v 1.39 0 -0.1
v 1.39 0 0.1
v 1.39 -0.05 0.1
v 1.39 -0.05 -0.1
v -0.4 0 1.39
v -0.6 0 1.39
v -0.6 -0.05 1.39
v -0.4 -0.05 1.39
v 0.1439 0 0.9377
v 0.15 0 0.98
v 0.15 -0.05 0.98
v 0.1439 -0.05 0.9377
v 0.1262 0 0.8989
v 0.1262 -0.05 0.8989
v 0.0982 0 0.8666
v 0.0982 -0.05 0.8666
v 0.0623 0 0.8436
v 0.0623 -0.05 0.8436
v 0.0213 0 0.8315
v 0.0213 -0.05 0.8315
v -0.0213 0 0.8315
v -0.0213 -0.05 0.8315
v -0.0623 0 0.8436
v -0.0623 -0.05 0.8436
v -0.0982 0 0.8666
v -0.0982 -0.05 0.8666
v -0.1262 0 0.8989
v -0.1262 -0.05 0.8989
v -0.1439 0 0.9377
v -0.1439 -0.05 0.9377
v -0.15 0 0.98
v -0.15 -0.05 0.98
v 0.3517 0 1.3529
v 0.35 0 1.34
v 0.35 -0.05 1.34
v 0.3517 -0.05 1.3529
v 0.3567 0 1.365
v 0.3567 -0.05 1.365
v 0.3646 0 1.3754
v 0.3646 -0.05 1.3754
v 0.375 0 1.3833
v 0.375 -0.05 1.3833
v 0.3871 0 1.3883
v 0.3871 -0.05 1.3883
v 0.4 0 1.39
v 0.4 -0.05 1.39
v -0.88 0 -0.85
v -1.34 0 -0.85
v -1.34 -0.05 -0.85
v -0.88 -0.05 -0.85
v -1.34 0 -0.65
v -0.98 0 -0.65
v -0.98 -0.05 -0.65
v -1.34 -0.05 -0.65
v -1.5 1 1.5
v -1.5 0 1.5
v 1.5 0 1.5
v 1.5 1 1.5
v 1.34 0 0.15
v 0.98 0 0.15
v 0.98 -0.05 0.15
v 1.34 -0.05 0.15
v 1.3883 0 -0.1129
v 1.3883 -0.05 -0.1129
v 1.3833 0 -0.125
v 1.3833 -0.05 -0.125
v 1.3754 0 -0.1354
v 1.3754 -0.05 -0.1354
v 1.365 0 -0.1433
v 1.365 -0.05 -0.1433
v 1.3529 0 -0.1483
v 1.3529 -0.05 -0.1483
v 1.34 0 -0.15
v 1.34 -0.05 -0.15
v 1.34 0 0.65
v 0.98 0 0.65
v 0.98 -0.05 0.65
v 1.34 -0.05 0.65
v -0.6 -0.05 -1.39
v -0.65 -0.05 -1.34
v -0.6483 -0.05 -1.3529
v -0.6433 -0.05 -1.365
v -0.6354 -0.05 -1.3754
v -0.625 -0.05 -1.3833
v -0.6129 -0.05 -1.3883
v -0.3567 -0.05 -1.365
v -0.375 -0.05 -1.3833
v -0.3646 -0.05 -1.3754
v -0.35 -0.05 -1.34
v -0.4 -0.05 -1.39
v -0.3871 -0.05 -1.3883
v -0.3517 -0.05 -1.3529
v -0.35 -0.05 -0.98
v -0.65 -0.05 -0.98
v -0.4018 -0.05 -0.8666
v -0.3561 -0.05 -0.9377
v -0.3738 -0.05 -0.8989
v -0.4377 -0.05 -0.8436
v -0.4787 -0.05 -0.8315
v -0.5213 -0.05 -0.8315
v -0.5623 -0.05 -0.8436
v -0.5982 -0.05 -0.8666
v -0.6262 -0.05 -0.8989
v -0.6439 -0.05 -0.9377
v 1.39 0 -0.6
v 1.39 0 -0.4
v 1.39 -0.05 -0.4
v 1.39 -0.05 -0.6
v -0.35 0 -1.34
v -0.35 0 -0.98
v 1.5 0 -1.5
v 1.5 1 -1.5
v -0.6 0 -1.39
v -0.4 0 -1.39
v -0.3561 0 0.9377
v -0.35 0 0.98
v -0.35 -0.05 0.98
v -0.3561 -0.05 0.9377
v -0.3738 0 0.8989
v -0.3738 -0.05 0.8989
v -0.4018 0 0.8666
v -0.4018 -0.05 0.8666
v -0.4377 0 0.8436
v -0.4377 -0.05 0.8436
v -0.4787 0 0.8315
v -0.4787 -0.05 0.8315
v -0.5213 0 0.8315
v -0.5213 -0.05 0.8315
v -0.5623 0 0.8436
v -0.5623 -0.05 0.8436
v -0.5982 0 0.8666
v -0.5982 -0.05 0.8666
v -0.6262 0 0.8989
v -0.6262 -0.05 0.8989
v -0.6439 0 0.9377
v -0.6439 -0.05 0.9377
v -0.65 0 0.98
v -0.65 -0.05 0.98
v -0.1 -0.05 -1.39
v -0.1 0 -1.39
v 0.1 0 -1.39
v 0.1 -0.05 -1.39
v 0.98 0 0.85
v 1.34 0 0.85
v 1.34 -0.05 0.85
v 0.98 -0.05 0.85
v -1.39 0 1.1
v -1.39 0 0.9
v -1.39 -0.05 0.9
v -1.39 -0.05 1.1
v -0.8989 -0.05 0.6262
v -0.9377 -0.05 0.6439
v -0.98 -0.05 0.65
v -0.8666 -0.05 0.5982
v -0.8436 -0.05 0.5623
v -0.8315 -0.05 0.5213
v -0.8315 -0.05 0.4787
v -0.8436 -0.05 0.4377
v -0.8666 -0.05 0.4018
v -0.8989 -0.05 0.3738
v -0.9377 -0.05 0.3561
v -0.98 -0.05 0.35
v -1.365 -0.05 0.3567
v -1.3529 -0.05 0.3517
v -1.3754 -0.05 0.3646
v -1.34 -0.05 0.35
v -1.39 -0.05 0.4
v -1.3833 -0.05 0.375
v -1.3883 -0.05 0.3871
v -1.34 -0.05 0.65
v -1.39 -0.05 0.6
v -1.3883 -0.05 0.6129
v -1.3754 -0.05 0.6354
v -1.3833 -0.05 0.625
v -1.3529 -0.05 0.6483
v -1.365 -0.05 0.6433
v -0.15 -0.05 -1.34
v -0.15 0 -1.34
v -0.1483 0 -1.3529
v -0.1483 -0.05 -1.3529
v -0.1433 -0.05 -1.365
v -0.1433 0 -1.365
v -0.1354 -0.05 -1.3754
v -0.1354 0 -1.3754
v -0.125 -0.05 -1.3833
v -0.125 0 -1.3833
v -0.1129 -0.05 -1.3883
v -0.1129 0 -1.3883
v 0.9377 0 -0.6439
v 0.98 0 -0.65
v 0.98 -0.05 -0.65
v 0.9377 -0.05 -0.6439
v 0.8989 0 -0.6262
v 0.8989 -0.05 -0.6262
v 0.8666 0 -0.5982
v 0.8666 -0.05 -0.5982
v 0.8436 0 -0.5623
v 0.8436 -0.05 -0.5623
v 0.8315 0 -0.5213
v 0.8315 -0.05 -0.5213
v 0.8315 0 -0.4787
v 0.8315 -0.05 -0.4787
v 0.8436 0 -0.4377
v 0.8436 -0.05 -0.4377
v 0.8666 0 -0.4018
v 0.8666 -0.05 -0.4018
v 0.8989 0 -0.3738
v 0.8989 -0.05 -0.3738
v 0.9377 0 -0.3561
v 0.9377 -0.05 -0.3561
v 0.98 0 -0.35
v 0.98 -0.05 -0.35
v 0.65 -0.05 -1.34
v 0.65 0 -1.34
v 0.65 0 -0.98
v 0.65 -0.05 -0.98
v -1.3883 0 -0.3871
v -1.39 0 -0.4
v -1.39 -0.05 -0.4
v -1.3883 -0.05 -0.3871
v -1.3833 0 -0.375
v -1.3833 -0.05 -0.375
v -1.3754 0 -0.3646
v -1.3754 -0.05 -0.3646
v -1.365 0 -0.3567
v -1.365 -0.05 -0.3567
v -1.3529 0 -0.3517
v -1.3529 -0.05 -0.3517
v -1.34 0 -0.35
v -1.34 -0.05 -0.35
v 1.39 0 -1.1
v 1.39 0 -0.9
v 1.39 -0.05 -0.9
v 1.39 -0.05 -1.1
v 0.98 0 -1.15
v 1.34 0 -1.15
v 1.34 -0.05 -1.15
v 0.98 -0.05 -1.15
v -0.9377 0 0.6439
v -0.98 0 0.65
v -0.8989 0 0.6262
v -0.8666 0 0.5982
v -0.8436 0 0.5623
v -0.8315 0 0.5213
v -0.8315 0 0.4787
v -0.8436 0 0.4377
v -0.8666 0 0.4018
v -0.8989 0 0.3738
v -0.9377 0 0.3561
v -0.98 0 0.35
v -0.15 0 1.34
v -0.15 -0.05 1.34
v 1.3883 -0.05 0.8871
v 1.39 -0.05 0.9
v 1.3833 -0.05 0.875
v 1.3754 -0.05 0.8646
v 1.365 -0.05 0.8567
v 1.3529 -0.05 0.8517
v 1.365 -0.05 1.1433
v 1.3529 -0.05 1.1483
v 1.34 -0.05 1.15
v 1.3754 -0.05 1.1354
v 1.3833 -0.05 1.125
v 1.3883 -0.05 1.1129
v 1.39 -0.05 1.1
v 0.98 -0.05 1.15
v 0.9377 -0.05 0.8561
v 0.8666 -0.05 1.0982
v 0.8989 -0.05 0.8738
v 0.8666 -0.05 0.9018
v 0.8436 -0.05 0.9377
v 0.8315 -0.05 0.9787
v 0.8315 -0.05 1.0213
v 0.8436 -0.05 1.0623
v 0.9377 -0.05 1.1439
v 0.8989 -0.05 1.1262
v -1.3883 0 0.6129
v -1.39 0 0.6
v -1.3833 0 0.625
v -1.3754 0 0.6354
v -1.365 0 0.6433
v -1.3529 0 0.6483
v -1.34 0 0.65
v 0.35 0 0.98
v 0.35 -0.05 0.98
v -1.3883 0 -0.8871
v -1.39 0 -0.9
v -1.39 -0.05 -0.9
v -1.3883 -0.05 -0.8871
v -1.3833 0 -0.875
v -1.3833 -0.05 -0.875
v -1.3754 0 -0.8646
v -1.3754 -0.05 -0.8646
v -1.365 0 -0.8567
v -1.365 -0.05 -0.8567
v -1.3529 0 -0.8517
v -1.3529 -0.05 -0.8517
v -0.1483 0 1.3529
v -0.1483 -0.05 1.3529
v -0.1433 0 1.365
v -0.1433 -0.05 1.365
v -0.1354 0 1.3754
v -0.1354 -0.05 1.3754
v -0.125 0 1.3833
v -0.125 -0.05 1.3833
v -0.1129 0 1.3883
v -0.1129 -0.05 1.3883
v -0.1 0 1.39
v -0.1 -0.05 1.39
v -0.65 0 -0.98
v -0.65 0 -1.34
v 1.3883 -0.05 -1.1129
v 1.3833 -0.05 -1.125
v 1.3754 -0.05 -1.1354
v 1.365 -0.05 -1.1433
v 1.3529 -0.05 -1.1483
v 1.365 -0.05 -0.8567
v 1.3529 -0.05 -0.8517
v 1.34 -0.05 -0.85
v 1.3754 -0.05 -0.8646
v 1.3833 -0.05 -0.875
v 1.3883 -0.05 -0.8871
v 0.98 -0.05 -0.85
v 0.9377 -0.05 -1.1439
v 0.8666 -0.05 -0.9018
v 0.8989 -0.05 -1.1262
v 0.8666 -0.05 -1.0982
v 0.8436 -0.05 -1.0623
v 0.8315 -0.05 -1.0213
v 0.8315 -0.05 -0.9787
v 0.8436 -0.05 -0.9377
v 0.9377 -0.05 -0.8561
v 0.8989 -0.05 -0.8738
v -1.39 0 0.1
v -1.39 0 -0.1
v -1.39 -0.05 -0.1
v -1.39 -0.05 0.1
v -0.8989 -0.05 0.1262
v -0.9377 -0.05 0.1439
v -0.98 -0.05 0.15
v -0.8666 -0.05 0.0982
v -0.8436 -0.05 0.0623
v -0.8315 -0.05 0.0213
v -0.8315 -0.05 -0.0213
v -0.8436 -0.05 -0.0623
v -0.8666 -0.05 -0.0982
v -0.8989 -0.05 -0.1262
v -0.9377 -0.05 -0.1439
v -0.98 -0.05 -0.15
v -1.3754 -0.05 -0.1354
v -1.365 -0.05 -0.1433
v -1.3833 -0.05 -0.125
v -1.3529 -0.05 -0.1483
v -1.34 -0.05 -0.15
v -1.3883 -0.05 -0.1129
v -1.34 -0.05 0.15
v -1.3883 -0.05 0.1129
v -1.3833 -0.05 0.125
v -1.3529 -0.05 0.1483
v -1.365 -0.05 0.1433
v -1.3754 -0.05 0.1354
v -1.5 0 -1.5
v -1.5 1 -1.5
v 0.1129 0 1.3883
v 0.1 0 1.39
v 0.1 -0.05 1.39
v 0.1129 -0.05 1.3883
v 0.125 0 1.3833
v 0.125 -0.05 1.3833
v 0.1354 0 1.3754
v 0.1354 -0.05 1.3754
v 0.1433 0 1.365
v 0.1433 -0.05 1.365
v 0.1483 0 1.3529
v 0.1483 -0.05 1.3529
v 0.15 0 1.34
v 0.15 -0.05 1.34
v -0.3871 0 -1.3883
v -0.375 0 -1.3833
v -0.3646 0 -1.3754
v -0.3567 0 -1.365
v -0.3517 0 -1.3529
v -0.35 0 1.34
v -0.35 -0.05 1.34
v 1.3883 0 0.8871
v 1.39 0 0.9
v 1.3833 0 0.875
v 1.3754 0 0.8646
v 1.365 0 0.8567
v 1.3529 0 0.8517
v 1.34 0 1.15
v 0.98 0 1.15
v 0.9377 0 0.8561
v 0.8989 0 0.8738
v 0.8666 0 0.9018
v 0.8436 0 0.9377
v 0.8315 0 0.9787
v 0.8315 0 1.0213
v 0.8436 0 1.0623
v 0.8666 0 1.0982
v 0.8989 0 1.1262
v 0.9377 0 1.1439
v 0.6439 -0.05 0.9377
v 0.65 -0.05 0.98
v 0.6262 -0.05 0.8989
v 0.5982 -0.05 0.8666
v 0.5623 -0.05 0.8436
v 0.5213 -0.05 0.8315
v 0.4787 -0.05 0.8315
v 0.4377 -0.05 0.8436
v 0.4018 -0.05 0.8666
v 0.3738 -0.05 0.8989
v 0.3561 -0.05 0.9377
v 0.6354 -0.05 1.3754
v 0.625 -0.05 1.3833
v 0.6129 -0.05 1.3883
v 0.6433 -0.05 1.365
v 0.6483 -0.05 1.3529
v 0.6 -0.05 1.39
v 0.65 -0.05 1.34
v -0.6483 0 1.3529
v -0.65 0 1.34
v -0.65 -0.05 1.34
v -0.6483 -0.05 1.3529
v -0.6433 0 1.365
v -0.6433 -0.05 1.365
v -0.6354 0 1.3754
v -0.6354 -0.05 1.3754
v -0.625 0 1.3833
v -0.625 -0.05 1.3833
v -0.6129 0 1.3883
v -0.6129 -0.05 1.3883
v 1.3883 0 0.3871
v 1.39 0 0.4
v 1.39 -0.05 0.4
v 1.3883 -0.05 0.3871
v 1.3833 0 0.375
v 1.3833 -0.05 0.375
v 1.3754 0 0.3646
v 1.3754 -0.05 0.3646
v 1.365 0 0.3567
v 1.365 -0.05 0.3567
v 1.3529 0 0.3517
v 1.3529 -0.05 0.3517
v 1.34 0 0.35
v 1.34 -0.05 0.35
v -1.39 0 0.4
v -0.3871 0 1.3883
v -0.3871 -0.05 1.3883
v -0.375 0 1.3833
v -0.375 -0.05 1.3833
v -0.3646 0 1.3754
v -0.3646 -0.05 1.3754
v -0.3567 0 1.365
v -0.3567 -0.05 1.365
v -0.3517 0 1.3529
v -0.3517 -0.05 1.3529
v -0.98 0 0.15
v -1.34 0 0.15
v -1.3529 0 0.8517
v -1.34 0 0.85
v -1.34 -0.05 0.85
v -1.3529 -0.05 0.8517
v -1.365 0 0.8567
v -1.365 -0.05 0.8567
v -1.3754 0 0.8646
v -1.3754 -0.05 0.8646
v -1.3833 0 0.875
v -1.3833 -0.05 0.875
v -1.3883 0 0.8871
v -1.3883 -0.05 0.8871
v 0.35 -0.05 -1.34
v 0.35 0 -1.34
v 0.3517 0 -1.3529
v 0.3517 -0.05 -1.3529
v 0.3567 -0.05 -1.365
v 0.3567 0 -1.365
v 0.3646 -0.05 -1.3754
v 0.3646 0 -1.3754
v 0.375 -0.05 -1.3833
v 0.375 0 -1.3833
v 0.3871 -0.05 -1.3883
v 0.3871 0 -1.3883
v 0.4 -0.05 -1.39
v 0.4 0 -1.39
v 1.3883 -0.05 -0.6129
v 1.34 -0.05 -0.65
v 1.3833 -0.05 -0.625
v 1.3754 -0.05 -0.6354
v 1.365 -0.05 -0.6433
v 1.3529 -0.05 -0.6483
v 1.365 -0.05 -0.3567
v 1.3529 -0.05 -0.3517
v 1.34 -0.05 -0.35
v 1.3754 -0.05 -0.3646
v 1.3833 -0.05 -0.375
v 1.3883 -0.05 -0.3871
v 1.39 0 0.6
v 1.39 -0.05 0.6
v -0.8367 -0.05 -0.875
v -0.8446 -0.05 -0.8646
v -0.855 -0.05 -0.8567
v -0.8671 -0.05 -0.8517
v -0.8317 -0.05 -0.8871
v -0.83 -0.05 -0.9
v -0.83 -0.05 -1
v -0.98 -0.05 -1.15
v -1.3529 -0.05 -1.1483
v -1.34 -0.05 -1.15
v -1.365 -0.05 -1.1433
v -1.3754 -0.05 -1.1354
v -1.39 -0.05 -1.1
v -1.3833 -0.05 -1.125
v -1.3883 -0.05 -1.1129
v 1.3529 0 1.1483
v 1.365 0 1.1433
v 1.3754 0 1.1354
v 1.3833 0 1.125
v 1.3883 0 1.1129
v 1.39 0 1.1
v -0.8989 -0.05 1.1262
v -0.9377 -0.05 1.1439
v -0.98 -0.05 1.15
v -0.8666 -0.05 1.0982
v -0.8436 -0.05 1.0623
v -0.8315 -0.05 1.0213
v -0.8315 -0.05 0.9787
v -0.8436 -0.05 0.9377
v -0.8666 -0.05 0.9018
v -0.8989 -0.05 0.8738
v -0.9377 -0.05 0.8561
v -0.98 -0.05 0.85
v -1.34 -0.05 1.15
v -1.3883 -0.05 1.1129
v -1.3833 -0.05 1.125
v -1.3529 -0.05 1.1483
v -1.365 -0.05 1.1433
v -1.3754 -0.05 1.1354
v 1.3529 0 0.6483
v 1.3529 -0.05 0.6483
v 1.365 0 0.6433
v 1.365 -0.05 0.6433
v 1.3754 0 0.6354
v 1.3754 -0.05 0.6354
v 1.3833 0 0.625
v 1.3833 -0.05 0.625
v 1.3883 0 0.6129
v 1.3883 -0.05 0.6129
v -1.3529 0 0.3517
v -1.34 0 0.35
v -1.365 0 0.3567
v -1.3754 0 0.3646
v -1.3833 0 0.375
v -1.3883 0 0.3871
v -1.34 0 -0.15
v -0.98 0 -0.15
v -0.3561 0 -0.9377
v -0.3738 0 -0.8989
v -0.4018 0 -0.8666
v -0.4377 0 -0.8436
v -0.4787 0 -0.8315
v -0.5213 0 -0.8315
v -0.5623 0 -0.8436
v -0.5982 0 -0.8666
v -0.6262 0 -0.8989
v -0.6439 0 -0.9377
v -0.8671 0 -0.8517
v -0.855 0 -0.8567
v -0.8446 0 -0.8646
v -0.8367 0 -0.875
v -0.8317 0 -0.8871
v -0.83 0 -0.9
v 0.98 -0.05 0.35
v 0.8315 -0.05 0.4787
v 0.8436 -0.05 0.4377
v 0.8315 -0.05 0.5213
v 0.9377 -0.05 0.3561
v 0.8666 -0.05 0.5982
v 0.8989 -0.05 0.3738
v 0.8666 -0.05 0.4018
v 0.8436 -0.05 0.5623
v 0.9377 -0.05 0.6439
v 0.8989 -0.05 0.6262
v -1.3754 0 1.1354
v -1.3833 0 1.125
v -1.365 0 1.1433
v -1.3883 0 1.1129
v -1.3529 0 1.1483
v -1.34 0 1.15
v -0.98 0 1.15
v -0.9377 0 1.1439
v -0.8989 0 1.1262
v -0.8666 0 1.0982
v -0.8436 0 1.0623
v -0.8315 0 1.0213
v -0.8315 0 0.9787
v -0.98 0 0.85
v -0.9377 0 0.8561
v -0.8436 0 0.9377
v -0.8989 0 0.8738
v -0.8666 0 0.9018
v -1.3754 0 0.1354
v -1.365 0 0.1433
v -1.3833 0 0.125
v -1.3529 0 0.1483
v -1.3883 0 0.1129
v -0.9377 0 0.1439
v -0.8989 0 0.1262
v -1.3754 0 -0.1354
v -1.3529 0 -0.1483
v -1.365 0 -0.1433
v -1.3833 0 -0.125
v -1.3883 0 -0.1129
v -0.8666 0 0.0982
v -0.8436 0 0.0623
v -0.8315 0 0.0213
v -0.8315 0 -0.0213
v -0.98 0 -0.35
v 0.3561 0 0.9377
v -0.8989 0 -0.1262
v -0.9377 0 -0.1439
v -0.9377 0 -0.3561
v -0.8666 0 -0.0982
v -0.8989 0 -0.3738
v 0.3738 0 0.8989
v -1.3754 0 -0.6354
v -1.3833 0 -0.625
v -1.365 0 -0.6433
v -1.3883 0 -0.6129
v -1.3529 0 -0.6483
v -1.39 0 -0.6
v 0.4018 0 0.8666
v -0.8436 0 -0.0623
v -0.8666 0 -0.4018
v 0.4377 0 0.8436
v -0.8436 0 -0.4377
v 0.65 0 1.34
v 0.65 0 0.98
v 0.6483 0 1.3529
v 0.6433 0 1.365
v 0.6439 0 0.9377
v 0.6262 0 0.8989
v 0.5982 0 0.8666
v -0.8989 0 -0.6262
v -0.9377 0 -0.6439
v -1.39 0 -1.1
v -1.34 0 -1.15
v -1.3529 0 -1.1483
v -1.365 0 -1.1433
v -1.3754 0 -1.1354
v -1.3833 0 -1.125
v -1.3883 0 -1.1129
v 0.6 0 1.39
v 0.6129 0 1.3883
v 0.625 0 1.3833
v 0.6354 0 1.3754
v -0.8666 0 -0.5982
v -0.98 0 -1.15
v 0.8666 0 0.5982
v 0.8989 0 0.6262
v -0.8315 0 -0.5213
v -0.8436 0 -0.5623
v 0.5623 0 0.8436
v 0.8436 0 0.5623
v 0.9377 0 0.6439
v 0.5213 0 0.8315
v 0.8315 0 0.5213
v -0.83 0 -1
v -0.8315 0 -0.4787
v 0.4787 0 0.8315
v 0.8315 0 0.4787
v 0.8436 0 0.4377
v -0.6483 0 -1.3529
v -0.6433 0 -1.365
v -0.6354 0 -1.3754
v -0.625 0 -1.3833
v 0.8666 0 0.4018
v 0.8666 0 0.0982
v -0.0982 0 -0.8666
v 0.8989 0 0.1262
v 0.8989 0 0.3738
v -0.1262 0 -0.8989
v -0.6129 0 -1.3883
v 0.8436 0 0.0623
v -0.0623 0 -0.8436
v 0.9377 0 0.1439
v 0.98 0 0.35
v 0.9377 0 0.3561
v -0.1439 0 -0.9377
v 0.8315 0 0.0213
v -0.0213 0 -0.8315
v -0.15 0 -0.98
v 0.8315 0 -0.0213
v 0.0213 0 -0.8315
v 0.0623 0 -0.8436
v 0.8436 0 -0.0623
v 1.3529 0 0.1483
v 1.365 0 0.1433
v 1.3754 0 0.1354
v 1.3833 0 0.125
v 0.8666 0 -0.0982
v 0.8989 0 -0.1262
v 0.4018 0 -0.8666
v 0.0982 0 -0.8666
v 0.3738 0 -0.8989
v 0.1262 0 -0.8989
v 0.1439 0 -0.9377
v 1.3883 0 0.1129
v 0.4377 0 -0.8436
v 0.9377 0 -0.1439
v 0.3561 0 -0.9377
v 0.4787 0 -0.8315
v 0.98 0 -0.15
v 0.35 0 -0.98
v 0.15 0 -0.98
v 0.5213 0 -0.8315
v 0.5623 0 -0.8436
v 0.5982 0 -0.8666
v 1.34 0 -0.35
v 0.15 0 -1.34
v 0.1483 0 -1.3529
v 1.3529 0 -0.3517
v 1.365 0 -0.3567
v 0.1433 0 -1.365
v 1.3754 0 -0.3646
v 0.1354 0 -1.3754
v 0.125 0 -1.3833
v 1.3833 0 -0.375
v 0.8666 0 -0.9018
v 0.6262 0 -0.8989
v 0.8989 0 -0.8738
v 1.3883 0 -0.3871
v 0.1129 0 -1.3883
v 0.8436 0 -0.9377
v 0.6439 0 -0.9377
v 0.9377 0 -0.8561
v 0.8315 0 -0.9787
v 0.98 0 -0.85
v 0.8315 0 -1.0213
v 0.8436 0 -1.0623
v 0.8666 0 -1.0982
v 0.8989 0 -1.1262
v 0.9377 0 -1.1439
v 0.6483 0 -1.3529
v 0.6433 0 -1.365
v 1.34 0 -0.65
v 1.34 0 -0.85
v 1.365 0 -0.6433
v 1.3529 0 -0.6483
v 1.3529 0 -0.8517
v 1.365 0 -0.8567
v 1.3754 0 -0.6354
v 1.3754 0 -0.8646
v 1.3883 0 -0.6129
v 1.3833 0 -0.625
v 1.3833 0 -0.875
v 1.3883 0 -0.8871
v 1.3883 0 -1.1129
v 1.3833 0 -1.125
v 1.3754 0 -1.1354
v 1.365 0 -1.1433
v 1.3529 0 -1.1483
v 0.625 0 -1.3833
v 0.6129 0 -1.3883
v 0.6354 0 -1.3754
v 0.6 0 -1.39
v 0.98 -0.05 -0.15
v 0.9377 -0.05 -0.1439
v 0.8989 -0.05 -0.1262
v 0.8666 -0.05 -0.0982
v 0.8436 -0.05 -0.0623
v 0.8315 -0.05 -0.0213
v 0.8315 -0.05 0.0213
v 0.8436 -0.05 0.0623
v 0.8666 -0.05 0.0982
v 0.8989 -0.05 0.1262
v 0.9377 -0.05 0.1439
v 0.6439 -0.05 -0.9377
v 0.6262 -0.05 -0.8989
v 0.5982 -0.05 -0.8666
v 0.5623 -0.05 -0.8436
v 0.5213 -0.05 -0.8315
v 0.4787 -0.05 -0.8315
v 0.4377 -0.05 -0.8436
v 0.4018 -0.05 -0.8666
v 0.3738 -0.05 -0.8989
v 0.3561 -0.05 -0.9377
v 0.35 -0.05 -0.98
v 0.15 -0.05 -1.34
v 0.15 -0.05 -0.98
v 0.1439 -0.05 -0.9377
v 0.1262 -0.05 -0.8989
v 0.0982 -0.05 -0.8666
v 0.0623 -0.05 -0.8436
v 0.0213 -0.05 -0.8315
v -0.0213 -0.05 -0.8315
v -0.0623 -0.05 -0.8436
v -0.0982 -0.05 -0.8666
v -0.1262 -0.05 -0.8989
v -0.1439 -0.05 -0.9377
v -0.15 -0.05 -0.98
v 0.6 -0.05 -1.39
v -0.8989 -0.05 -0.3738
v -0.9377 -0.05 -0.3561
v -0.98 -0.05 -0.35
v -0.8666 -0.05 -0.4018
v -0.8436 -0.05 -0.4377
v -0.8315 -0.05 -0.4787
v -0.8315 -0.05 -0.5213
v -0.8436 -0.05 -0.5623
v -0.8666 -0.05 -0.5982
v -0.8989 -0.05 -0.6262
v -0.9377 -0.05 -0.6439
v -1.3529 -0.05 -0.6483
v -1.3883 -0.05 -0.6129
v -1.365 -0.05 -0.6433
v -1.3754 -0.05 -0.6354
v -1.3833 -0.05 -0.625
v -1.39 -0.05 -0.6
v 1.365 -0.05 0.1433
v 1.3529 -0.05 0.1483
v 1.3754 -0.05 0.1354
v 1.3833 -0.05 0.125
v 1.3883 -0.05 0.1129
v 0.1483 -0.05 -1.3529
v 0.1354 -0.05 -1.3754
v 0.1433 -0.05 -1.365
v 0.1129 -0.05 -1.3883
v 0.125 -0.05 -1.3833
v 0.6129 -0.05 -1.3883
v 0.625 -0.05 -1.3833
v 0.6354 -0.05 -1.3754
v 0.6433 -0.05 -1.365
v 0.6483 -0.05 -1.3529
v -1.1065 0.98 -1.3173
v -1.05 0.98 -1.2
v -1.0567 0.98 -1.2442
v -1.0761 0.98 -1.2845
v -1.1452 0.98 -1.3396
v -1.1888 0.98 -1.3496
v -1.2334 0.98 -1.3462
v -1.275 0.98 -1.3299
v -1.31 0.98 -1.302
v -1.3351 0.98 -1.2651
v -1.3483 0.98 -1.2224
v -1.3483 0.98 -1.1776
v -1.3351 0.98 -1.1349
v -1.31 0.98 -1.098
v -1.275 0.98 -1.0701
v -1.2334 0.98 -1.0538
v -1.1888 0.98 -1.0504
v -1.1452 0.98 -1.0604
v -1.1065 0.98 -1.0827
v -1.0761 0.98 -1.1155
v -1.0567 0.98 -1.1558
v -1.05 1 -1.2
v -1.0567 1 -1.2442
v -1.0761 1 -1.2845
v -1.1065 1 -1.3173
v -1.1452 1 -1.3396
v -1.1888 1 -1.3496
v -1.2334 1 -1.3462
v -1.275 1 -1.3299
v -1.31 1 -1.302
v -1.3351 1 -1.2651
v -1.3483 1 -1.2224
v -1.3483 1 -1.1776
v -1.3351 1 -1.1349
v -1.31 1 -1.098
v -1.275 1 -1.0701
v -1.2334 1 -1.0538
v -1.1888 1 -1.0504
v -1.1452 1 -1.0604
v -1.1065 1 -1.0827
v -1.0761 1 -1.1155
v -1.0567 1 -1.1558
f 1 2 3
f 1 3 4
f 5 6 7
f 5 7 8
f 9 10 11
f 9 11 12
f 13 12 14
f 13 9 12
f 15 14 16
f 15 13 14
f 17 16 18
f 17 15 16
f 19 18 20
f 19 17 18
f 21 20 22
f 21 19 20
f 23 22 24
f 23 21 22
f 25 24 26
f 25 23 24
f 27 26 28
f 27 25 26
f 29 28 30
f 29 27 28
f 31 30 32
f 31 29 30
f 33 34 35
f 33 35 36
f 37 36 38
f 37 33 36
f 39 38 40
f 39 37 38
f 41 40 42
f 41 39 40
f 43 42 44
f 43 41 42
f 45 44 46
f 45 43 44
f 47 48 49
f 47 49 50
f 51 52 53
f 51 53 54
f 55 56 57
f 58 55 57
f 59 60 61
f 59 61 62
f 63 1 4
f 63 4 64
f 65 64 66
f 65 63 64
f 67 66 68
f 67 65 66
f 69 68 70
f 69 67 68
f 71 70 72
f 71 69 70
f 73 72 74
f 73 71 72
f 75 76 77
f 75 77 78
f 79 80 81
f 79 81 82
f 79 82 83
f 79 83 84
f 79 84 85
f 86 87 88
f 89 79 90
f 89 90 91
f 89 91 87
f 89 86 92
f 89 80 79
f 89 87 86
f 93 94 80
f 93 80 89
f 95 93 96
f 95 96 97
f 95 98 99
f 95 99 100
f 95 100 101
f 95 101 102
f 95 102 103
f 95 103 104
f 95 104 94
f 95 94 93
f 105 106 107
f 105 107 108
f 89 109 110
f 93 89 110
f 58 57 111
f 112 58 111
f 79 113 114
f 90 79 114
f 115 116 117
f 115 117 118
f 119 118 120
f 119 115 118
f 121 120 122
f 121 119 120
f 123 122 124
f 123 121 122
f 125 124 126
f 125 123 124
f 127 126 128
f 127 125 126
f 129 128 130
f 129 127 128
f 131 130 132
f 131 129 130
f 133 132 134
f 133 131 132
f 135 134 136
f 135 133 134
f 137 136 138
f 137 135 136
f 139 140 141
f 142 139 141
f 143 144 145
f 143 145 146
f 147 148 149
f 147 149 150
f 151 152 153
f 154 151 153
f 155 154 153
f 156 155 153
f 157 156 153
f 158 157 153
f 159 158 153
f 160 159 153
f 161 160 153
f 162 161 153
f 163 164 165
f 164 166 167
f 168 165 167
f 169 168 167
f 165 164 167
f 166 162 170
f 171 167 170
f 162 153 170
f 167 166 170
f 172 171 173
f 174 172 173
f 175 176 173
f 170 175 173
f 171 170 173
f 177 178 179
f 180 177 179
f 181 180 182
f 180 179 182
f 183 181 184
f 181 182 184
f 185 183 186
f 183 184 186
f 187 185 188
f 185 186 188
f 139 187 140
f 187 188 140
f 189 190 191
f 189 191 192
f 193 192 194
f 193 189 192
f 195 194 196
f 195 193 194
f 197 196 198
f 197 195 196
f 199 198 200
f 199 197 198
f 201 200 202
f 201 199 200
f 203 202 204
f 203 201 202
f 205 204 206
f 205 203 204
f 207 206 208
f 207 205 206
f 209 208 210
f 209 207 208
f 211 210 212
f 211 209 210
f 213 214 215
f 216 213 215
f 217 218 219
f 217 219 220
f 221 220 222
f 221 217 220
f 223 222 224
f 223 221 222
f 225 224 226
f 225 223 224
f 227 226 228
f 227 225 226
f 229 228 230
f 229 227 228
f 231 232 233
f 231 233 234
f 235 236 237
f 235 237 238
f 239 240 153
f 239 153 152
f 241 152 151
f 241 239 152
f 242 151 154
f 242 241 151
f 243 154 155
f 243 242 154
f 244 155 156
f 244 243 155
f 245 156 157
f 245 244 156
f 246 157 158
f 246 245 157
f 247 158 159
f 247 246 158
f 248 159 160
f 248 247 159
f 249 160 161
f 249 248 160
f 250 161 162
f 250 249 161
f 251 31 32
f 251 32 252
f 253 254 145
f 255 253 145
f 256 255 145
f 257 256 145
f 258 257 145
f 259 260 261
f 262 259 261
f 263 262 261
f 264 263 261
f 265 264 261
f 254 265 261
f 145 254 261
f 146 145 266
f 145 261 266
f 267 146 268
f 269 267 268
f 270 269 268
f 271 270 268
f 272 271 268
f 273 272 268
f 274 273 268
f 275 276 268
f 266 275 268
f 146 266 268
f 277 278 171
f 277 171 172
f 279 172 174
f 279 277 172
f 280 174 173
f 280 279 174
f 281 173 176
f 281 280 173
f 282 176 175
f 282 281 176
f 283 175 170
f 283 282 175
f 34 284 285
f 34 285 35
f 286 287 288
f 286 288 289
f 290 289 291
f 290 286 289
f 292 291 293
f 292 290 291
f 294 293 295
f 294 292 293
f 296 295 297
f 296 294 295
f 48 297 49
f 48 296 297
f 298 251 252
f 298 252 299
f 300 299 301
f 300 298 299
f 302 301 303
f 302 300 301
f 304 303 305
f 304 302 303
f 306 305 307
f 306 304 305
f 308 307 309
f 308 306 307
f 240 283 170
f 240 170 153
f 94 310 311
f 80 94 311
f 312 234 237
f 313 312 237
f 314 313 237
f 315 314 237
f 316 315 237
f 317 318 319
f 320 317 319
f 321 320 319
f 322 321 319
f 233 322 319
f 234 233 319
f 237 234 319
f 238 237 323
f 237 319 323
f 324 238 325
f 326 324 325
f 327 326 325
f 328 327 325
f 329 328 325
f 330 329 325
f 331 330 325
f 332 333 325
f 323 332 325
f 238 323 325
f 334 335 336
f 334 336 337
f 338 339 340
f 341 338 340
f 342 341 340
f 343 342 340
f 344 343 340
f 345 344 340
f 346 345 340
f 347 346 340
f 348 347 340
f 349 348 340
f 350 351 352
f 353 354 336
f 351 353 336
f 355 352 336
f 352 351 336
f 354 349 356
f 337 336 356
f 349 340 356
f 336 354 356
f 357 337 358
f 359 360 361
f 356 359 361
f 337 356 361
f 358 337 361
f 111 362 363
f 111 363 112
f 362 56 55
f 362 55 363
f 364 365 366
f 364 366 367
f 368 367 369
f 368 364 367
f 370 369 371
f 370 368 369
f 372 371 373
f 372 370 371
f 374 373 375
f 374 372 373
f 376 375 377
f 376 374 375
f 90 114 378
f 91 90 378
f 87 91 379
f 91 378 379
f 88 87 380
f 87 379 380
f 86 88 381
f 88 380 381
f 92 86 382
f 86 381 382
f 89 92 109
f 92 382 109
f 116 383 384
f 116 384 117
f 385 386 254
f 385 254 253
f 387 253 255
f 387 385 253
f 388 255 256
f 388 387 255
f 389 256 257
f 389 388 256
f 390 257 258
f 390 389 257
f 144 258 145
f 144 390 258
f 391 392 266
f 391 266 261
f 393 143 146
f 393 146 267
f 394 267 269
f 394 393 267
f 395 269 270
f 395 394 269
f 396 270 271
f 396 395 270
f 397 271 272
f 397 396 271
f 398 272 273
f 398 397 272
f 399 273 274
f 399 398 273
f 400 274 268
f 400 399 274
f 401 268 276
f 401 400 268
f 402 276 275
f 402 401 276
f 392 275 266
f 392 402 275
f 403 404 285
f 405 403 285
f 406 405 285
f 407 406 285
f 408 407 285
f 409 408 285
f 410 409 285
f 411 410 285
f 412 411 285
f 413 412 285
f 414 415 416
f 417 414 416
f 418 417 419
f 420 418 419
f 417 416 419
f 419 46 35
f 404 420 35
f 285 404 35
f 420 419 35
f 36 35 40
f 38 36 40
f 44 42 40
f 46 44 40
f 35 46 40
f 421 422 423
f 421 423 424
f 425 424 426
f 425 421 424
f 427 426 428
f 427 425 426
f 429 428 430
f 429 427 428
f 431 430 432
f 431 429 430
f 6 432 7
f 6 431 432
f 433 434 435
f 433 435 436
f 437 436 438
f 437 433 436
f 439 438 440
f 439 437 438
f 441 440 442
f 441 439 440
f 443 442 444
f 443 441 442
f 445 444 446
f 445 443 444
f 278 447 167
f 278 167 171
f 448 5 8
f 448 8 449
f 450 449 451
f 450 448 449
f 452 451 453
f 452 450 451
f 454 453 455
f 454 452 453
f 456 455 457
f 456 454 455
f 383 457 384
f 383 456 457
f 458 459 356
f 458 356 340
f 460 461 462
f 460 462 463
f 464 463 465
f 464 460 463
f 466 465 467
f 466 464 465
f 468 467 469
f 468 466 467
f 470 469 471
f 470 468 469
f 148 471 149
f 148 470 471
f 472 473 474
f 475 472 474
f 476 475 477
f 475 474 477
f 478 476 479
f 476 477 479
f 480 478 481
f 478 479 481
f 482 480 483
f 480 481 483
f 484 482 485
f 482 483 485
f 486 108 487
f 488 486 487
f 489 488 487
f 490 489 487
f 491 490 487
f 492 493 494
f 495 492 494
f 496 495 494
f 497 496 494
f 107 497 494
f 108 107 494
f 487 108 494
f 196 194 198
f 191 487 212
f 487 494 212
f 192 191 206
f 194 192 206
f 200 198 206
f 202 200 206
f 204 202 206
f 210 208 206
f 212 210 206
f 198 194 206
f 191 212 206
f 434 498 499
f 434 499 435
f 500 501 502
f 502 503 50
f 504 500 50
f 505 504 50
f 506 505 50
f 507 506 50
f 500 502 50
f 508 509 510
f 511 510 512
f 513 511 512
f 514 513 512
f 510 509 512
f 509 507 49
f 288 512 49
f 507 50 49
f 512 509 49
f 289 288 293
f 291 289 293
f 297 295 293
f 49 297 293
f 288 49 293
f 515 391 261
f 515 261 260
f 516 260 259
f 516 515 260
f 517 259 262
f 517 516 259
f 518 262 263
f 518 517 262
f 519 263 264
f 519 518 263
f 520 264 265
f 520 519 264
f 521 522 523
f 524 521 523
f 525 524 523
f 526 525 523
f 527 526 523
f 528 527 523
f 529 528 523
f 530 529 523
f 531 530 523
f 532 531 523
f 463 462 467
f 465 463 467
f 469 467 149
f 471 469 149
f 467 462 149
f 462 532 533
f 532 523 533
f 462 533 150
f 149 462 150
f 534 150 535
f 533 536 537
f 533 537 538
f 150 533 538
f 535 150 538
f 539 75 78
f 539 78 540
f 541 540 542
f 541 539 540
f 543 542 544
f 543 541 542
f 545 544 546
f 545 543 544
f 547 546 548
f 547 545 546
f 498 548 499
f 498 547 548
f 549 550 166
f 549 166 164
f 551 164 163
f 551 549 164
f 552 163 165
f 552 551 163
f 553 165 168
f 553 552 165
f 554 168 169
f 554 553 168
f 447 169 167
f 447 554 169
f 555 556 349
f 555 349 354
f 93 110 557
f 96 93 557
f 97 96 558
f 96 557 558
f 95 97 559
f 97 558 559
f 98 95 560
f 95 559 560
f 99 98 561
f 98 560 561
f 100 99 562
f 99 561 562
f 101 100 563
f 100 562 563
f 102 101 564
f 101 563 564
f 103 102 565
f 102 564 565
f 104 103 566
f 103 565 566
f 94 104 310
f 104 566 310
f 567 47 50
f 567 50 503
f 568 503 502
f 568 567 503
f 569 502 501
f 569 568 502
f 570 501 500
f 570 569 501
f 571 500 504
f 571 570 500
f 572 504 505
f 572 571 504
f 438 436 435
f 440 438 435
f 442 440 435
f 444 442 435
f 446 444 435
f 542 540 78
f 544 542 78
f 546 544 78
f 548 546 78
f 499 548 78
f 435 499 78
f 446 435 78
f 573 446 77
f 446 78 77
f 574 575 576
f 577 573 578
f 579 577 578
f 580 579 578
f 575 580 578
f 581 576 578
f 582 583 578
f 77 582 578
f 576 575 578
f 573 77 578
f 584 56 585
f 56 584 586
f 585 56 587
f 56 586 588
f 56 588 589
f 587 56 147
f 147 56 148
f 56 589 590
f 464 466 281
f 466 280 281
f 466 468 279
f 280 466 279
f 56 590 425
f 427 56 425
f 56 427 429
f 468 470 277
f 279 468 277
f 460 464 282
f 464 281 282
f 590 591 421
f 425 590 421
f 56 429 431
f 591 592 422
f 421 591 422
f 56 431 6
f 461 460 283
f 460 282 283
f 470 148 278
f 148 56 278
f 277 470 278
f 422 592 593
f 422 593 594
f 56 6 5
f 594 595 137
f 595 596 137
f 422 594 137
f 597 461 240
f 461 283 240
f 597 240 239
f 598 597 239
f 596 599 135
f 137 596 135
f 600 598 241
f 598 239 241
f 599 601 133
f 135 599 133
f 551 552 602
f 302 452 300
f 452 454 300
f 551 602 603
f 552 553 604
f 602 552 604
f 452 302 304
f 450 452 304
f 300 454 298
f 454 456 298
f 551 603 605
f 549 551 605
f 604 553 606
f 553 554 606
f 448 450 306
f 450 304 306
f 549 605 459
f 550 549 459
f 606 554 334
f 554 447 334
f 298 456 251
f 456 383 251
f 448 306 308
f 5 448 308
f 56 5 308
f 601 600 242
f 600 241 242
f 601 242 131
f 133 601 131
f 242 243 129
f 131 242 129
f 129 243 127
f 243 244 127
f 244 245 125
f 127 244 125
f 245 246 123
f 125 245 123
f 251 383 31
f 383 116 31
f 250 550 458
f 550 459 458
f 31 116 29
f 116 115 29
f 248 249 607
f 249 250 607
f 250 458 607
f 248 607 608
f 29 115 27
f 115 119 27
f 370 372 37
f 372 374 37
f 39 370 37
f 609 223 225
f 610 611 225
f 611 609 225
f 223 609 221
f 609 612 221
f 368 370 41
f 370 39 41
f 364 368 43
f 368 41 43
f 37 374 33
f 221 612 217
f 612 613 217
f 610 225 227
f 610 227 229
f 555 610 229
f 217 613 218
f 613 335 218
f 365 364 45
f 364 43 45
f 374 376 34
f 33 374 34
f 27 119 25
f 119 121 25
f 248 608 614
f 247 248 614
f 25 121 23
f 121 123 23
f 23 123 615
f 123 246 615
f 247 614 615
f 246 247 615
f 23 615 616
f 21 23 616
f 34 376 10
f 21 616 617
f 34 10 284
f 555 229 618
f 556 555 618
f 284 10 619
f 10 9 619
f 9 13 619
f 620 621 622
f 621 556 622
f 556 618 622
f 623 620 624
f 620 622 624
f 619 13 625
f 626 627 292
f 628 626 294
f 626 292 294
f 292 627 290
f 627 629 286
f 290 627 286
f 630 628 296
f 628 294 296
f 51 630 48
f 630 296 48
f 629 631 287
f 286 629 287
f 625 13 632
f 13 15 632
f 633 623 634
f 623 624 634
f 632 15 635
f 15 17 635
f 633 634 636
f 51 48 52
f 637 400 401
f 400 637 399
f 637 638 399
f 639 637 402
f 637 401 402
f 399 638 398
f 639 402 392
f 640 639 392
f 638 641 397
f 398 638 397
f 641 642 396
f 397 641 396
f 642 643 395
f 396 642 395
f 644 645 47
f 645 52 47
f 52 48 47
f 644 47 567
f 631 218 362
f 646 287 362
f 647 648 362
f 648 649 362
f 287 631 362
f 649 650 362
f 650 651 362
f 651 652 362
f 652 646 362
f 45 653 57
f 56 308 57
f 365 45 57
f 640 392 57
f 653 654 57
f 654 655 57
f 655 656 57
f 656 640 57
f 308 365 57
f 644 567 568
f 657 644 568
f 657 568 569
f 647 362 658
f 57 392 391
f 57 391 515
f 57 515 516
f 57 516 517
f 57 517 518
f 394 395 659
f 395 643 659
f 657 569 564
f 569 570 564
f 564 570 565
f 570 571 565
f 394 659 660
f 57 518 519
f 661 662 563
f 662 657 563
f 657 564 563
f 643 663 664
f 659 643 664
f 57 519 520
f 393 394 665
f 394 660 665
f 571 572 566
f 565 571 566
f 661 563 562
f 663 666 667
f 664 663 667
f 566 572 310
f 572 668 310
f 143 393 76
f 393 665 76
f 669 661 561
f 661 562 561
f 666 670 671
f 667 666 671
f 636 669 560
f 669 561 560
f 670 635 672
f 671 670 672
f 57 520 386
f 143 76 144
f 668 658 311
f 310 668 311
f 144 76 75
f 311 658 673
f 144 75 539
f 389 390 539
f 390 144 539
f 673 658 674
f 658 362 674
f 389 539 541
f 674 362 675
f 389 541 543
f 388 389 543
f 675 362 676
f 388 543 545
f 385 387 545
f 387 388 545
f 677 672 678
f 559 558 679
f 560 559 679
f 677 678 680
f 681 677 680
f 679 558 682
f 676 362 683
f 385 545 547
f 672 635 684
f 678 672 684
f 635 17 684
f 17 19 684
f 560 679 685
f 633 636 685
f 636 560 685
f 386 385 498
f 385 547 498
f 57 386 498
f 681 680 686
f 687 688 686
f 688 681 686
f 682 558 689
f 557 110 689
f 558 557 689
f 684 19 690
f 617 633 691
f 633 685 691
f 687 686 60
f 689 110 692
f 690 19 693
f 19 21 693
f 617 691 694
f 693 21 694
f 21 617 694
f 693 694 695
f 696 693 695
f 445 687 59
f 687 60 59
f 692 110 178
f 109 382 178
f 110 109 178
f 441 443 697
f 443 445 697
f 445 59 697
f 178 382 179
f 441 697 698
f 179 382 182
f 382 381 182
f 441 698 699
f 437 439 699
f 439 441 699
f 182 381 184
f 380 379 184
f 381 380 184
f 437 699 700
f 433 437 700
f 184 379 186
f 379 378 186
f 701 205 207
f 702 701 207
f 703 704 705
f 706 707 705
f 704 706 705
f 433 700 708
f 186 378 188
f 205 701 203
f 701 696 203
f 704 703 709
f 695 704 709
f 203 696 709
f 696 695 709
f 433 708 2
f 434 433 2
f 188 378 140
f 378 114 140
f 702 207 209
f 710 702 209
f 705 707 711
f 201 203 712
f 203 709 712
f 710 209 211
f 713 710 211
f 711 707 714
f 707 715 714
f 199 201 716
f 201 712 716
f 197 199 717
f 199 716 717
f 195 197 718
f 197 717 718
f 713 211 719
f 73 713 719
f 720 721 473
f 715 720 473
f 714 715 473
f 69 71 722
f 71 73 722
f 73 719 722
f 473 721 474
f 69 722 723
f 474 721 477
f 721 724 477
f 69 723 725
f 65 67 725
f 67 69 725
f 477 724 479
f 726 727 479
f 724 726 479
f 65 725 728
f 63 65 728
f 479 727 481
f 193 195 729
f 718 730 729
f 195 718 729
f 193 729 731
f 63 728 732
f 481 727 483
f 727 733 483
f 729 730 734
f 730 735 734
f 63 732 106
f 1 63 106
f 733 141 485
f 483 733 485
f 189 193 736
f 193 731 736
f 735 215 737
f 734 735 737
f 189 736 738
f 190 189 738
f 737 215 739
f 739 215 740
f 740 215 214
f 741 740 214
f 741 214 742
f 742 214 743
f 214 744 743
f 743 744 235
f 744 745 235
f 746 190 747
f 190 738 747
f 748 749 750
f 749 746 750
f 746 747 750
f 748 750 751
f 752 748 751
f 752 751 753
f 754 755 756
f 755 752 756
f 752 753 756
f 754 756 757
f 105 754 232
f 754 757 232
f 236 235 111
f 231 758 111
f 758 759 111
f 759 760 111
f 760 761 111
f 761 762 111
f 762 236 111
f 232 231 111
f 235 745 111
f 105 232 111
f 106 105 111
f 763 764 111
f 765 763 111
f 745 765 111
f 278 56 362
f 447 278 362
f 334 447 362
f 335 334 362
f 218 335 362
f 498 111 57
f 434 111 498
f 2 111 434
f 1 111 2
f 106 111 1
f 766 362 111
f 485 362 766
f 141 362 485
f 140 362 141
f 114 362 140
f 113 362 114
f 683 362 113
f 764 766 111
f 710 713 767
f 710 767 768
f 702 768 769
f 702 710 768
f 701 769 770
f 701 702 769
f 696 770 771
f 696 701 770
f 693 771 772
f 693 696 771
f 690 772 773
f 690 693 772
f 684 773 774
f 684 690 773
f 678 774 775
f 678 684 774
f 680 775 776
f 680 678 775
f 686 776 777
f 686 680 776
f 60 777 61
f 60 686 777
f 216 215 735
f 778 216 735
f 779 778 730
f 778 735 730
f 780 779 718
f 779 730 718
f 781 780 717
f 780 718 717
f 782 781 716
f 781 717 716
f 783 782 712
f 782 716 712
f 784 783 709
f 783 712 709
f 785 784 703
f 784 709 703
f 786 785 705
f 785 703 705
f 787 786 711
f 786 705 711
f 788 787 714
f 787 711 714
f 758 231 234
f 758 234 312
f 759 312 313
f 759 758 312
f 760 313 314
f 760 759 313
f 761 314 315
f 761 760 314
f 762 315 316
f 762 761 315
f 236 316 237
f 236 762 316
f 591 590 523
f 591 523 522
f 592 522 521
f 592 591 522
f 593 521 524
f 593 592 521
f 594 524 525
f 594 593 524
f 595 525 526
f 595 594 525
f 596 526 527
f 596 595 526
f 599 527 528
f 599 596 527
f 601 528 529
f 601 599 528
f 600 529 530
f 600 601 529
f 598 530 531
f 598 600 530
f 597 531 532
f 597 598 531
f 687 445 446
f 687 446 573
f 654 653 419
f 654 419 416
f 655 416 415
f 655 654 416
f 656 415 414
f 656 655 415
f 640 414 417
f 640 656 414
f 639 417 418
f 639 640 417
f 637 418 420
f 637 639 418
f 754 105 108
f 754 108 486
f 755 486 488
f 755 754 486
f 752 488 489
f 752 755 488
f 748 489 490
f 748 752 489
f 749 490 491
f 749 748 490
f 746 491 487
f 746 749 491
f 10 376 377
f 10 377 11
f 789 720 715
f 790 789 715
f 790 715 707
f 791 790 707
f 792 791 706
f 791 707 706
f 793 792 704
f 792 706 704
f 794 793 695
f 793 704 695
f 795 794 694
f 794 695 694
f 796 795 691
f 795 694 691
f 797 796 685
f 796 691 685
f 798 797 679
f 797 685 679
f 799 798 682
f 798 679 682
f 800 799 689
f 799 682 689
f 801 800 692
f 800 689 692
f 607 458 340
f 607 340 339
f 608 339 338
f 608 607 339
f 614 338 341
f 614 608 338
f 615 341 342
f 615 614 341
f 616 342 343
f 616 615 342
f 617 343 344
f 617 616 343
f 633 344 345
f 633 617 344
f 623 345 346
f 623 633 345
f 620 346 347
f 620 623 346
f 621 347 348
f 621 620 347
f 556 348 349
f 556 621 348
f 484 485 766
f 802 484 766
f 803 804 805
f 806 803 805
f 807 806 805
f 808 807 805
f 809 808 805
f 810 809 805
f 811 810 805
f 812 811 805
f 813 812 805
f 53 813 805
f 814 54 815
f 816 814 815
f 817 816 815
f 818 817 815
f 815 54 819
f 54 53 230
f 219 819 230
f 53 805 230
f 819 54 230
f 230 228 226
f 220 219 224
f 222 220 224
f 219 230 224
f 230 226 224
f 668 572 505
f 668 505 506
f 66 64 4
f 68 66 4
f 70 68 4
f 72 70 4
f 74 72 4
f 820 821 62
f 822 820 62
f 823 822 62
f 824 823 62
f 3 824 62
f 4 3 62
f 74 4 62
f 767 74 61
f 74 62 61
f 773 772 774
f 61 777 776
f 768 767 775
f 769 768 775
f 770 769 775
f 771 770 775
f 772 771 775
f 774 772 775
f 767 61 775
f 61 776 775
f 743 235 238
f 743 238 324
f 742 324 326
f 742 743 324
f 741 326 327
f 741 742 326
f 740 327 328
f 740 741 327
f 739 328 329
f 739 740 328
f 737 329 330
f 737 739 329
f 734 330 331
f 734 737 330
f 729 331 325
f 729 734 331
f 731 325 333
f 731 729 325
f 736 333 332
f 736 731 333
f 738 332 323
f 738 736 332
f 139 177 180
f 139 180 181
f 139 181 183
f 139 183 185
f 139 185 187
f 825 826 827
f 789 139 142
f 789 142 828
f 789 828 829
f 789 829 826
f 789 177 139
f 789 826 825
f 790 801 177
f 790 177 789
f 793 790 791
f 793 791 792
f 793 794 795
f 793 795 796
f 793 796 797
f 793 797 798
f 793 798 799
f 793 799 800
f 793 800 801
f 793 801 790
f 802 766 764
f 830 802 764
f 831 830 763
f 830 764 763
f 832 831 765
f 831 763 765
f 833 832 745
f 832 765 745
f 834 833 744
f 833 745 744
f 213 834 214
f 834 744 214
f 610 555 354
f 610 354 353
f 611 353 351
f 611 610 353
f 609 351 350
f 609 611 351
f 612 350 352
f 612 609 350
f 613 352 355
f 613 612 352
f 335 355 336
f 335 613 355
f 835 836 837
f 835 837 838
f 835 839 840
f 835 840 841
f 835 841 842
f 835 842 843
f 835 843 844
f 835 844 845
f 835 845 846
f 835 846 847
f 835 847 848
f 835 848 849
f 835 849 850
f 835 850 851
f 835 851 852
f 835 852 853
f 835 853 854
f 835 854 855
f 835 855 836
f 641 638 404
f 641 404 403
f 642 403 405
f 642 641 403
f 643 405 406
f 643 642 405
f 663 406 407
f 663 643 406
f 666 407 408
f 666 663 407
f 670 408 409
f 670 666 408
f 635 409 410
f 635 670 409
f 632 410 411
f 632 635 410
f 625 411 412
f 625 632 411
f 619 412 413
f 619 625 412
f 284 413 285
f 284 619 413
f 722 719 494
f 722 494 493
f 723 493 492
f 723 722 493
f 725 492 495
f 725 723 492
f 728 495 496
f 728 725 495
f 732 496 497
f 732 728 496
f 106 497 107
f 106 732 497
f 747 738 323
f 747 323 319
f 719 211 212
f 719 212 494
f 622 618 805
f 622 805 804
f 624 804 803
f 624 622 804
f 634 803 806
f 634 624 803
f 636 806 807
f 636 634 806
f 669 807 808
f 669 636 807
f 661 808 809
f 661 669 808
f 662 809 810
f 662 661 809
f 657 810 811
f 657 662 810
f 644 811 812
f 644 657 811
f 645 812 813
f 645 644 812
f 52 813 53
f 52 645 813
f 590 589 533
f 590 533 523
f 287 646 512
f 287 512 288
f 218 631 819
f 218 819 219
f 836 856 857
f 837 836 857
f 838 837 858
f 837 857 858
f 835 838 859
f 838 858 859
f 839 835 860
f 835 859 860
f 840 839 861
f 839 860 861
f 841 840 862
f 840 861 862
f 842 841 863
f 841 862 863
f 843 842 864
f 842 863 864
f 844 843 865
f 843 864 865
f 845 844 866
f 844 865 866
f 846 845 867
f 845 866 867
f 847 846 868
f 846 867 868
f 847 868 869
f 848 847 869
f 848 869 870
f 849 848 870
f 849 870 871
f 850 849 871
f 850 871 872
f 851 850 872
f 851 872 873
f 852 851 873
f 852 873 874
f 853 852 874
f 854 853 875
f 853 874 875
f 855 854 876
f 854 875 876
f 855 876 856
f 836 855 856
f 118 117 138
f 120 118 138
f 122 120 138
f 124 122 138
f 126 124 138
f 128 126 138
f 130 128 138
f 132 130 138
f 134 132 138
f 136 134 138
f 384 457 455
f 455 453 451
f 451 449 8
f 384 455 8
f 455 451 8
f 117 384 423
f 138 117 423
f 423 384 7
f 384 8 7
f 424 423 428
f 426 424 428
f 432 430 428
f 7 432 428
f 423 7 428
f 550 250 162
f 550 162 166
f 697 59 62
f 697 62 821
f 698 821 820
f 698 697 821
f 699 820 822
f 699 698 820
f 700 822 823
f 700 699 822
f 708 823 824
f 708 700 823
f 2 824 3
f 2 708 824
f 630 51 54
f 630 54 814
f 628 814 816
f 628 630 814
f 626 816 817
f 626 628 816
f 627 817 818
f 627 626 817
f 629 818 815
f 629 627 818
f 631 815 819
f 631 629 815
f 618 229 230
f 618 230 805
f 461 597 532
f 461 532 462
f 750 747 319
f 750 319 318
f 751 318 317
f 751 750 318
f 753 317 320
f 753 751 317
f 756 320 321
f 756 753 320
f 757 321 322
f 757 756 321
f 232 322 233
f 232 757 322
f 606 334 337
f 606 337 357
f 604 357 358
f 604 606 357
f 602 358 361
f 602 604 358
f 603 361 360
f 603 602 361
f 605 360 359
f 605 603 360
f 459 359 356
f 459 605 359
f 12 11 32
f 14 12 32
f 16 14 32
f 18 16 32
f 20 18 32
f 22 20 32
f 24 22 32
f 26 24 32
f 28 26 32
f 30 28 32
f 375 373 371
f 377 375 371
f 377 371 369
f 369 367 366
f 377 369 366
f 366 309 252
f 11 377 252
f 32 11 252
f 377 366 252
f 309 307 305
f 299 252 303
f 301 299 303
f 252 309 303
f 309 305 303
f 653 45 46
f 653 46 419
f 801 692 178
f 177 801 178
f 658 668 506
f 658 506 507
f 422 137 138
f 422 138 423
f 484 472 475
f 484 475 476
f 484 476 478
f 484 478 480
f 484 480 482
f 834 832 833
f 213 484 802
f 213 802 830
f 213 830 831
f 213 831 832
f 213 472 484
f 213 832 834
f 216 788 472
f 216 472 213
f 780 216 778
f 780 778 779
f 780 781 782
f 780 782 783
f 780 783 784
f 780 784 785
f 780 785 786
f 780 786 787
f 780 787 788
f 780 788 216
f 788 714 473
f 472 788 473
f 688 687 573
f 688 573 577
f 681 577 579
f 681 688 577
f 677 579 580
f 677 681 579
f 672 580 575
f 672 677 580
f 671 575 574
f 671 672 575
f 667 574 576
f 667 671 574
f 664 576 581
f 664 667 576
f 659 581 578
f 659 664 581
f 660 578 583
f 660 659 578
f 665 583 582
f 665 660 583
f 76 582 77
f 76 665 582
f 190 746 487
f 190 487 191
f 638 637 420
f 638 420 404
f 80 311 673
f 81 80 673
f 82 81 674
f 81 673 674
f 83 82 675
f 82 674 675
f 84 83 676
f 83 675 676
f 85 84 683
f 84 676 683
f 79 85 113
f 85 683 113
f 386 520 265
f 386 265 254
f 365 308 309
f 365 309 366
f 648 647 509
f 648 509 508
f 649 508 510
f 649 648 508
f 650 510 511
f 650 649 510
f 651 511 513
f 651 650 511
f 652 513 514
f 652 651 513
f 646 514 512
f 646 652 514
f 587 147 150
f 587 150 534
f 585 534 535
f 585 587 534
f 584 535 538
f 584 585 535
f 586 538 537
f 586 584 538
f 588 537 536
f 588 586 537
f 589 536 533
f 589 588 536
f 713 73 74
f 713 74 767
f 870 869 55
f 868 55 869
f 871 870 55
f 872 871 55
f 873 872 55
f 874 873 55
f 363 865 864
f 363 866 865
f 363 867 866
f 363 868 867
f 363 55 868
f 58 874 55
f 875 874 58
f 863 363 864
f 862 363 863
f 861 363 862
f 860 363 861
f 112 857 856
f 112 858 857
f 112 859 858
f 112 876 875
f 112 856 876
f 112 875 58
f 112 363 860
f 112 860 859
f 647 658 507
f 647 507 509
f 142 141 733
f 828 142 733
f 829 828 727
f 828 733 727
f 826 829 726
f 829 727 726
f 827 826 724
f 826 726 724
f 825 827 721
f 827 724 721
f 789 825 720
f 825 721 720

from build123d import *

# Parameters (mm, degrees)
SKETCH1_W           = 3
SKETCH1_H           = 3
BOSS_EXTRUDE1_DEPTH = 1
BOSS_EXTRUDE2_DEPTH = 0.05
SKETCH3_R           = 0.15
CUT_EXTRUDE1_DEPTH  = 0.02


with BuildPart() as part:
    # Sketch1 → Boss-Extrude1 (new body)
    with BuildSketch(Plane(origin=(0, 0, 0), x_dir=(1, 0, 0), z_dir=(0, 1, 0))):
        Rectangle(SKETCH1_W, SKETCH1_H)
    extrude(amount=BOSS_EXTRUDE1_DEPTH)

    # Sketch2 → Boss-Extrude2 (add)
    with BuildSketch(Plane.XZ):
        with BuildLine():
            Line((-0.6, 1.39), (-0.4, 1.39))
            ThreePointArc((-0.4, 1.39), (-0.364644661, 1.375355339), (-0.35, 1.34))
            Line((-0.35, 1.34), (-0.35, 0.98))
            ThreePointArc((-0.35, 0.98), (-0.5, 0.83), (-0.65, 0.98))
            Line((-0.65, 0.98), (-0.65, 1.34))
            ThreePointArc((-0.65, 1.34), (-0.635355339, 1.375355339), (-0.6, 1.39))
        make_face()
        with BuildLine():
            Line((-0.1, 1.39), (0.1, 1.39))
            ThreePointArc((0.1, 1.39), (0.135355339, 1.375355339), (0.15, 1.34))
            Line((0.15, 1.34), (0.15, 0.98))
            ThreePointArc((0.15, 0.98), (0, 0.83), (-0.15, 0.98))
            Line((-0.15, 0.98), (-0.15, 1.34))
            ThreePointArc((-0.15, 1.34), (-0.135355339, 1.375355339), (-0.1, 1.39))
        make_face()
        with BuildLine():
            Line((0.4, 1.39), (0.6, 1.39))
            ThreePointArc((0.6, 1.39), (0.635355339, 1.375355339), (0.65, 1.34))
            Line((0.65, 1.34), (0.65, 0.98))
            ThreePointArc((0.65, 0.98), (0.5, 0.83), (0.35, 0.98))
            Line((0.35, 0.98), (0.35, 1.34))
            ThreePointArc((0.35, 1.34), (0.364644661, 1.375355339), (0.4, 1.39))
        make_face()
        with BuildLine():
            Line((0.35, -0.98), (0.35, -1.34))
            ThreePointArc((0.35, -1.34), (0.364644661, -1.375355339), (0.4, -1.39))
            Line((0.4, -1.39), (0.6, -1.39))
            ThreePointArc((0.6, -1.39), (0.635355339, -1.375355339), (0.65, -1.34))
            Line((0.65, -1.34), (0.65, -0.98))
            ThreePointArc((0.65, -0.98), (0.5, -0.83), (0.35, -0.98))
        make_face()
        with BuildLine():
            Line((-0.15, -0.98), (-0.15, -1.34))
            ThreePointArc((-0.15, -1.34), (-0.135355339, -1.375355339), (-0.1, -1.39))
            Line((-0.1, -1.39), (0.1, -1.39))
            ThreePointArc((0.1, -1.39), (0.135355339, -1.375355339), (0.15, -1.34))
            Line((0.15, -1.34), (0.15, -0.98))
            ThreePointArc((0.15, -0.98), (0, -0.83), (-0.15, -0.98))
        make_face()
        with BuildLine():
            Line((-0.65, -0.98), (-0.65, -1.34))
            ThreePointArc((-0.65, -1.34), (-0.635355339, -1.375355339), (-0.6, -1.39))
            Line((-0.6, -1.39), (-0.4, -1.39))
            ThreePointArc((-0.4, -1.39), (-0.364644661, -1.375355339), (-0.35, -1.34))
            Line((-0.35, -1.34), (-0.35, -0.98))
            ThreePointArc((-0.35, -0.98), (-0.5, -0.83), (-0.65, -0.98))
        make_face()
        with BuildLine():
            Line((-1.34, 1.15), (-0.98, 1.15))
            ThreePointArc((-0.98, 1.15), (-0.83, 1), (-0.98, 0.85))
            Line((-0.98, 0.85), (-1.34, 0.85))
            ThreePointArc((-1.34, 0.85), (-1.375355339, 0.864644661), (-1.39, 0.9))
            Line((-1.39, 0.9), (-1.39, 1.1))
            ThreePointArc((-1.39, 1.1), (-1.375355339, 1.135355339), (-1.34, 1.15))
        make_face()
        with BuildLine():
            Line((-1.34, 0.65), (-0.98, 0.65))
            ThreePointArc((-0.98, 0.65), (-0.83, 0.5), (-0.98, 0.35))
            Line((-0.98, 0.35), (-1.34, 0.35))
            ThreePointArc((-1.34, 0.35), (-1.375355339, 0.364644661), (-1.39, 0.4))
            Line((-1.39, 0.4), (-1.39, 0.6))
            ThreePointArc((-1.39, 0.6), (-1.375355339, 0.635355339), (-1.34, 0.65))
        make_face()
        with BuildLine():
            Line((-1.34, 0.15), (-0.98, 0.15))
            ThreePointArc((-0.98, 0.15), (-0.83, 0), (-0.98, -0.15))
            Line((-0.98, -0.15), (-1.34, -0.15))
            ThreePointArc((-1.34, -0.15), (-1.375355339, -0.135355339), (-1.39, -0.1))
            Line((-1.39, -0.1), (-1.39, 0.1))
            ThreePointArc((-1.39, 0.1), (-1.375355339, 0.135355339), (-1.34, 0.15))
        make_face()
        with BuildLine():
            Line((-1.34, -0.35), (-0.98, -0.35))
            ThreePointArc((-0.98, -0.35), (-0.83, -0.5), (-0.98, -0.65))
            Line((-0.98, -0.65), (-1.34, -0.65))
            ThreePointArc((-1.34, -0.65), (-1.375355339, -0.635355339), (-1.39, -0.6))
            Line((-1.39, -0.6), (-1.39, -0.4))
            ThreePointArc((-1.39, -0.4), (-1.375355339, -0.364644661), (-1.34, -0.35))
        make_face()
        with BuildLine():
            Line((-1.34, -0.85), (-0.98, -0.85))
            Line((-0.98, -0.85), (-0.88, -0.85))
            ThreePointArc((-0.88, -0.85), (-0.844644661, -0.864644661), (-0.83, -0.9))
            Line((-0.83, -0.9), (-0.83, -1))
            Line((-0.83, -1), (-0.98, -1.15))
            Line((-0.98, -1.15), (-1.34, -1.15))
            ThreePointArc((-1.34, -1.15), (-1.375355339, -1.135355339), (-1.39, -1.1))
            Line((-1.39, -1.1), (-1.39, -0.9))
            ThreePointArc((-1.39, -0.9), (-1.375355339, -0.864644661), (-1.34, -0.85))
        make_face()
        with BuildLine():
            Line((0.98, -0.35), (1.34, -0.35))
            ThreePointArc((1.34, -0.35), (1.375355339, -0.364644661), (1.39, -0.4))
            Line((1.39, -0.4), (1.39, -0.6))
            ThreePointArc((1.39, -0.6), (1.375355339, -0.635355339), (1.34, -0.65))
            Line((1.34, -0.65), (0.98, -0.65))
            ThreePointArc((0.98, -0.65), (0.83, -0.5), (0.98, -0.35))
        make_face()
        with BuildLine():
            Line((0.98, -0.85), (1.34, -0.85))
            ThreePointArc((1.34, -0.85), (1.375355339, -0.864644661), (1.39, -0.9))
            Line((1.39, -0.9), (1.39, -1.1))
            ThreePointArc((1.39, -1.1), (1.375355339, -1.135355339), (1.34, -1.15))
            Line((1.34, -1.15), (0.98, -1.15))
            ThreePointArc((0.98, -1.15), (0.83, -1), (0.98, -0.85))
        make_face()
        with BuildLine():
            Line((0.98, 0.15), (1.34, 0.15))
            ThreePointArc((1.34, 0.15), (1.375355339, 0.135355339), (1.39, 0.1))
            Line((1.39, 0.1), (1.39, -0.1))
            ThreePointArc((1.39, -0.1), (1.375355339, -0.135355339), (1.34, -0.15))
            Line((1.34, -0.15), (0.98, -0.15))
            ThreePointArc((0.98, -0.15), (0.83, 0), (0.98, 0.15))
        make_face()
        with BuildLine():
            Line((0.98, 0.65), (1.34, 0.65))
            ThreePointArc((1.34, 0.65), (1.375355339, 0.635355339), (1.39, 0.6))
            Line((1.39, 0.6), (1.39, 0.4))
            ThreePointArc((1.39, 0.4), (1.375355339, 0.364644661), (1.34, 0.35))
            Line((1.34, 0.35), (0.98, 0.35))
            ThreePointArc((0.98, 0.35), (0.83, 0.5), (0.98, 0.65))
        make_face()
        with BuildLine():
            Line((0.98, 1.15), (1.34, 1.15))
            ThreePointArc((1.34, 1.15), (1.375355339, 1.135355339), (1.39, 1.1))
            Line((1.39, 1.1), (1.39, 0.9))
            ThreePointArc((1.39, 0.9), (1.375355339, 0.864644661), (1.34, 0.85))
            Line((1.34, 0.85), (0.98, 0.85))
            ThreePointArc((0.98, 0.85), (0.83, 1), (0.98, 1.15))
        make_face()
    extrude(amount=BOSS_EXTRUDE2_DEPTH)

    # Sketch3 → Cut-Extrude1 (cut)
    with BuildSketch(Plane(origin=(0, 1, 0), x_dir=(1, 0, 0), z_dir=(0, 1, 0))):
        with Locations((-1.2, 1.2)):
            Circle(SKETCH3_R)
    extrude(amount=-CUT_EXTRUDE1_DEPTH, mode=Mode.SUBTRACT)


solid = part.part
